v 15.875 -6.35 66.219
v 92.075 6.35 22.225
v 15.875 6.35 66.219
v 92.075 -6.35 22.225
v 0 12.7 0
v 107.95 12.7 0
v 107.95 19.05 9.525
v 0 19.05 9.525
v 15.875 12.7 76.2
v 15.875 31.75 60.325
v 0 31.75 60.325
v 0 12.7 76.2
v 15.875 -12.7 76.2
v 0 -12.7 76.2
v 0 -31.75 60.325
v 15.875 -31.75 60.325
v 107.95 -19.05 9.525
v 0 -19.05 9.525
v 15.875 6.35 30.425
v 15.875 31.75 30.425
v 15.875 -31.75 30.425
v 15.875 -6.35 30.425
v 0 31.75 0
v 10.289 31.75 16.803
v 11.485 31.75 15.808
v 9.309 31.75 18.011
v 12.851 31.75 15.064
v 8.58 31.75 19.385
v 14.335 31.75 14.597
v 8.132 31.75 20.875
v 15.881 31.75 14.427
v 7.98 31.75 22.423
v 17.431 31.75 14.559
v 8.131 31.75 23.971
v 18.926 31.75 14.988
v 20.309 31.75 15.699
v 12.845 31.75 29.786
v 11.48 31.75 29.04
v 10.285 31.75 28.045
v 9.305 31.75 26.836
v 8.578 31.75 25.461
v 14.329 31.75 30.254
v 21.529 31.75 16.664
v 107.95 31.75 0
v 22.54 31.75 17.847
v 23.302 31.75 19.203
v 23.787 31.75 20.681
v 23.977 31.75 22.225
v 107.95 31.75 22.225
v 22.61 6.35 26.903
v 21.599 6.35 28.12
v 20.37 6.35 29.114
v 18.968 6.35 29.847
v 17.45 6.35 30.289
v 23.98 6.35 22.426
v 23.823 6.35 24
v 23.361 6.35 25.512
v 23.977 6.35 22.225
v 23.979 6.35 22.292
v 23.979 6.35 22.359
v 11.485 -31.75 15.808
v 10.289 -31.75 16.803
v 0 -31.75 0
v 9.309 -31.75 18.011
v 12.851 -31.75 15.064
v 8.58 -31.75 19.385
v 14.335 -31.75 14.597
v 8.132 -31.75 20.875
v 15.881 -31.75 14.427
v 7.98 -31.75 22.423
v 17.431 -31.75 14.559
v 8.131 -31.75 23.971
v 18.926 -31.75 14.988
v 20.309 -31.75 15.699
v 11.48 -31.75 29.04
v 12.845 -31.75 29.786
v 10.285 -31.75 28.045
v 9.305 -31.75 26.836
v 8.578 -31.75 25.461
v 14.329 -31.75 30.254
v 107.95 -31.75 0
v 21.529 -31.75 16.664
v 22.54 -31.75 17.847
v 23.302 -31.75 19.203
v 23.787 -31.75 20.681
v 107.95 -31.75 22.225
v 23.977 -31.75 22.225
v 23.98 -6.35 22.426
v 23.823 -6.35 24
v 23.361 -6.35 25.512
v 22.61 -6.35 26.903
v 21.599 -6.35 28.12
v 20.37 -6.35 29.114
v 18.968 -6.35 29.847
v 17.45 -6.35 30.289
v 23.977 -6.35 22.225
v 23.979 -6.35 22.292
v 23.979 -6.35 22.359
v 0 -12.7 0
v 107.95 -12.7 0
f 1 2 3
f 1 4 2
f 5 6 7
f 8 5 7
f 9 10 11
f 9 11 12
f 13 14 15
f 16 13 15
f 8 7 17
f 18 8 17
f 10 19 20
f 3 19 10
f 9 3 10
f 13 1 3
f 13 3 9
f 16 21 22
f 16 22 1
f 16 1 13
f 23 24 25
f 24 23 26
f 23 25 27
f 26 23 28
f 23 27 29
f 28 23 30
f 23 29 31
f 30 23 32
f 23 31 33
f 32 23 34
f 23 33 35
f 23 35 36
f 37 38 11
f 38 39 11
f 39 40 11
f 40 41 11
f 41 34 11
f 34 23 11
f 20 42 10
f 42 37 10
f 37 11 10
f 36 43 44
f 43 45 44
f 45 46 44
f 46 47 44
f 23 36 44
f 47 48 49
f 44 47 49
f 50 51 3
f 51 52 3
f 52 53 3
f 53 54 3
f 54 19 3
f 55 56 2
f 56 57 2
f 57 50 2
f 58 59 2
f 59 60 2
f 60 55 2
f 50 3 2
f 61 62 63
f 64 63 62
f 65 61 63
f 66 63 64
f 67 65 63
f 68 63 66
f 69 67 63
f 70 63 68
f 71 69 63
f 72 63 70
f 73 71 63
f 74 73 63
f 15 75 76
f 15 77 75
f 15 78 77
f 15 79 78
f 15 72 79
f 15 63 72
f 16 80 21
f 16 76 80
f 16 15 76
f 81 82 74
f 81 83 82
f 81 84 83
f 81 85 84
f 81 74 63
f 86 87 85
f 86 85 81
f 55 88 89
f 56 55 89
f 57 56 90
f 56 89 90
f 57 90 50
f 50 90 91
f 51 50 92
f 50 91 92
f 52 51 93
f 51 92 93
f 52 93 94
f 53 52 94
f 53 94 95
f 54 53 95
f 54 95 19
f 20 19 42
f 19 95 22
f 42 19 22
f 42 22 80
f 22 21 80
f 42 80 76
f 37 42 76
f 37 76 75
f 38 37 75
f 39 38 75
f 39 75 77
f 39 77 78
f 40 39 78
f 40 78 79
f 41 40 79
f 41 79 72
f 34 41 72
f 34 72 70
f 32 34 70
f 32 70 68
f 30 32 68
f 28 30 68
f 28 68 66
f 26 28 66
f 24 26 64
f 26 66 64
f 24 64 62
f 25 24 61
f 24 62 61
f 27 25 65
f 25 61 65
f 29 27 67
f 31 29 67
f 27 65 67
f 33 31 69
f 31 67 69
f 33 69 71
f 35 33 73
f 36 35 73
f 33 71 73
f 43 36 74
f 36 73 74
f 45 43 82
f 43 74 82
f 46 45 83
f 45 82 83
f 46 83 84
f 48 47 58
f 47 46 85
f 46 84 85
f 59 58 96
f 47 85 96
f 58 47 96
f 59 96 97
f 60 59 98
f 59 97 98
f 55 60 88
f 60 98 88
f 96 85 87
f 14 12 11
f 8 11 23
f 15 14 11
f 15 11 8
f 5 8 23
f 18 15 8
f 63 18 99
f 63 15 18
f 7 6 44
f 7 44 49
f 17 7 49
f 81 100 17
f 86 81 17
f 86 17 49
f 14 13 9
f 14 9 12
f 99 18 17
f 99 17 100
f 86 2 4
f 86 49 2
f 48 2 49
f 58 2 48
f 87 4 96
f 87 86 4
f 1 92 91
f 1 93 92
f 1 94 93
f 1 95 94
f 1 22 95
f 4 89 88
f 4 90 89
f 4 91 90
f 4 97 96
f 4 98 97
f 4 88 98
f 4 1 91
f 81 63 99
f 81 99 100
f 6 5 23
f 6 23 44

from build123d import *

# Parameters (mm, degrees)
F1_DEPTH  = 31.75
F3_DEPTH  = 107.951
F5_DEPTH  = 6.35
F7_DEPTH  = 38.1
F8_DEPTH  = 25.4
F9_R      = 7.999836
F10_DEPTH = 127


with BuildPart() as f1:
    # F0 (on Front) → F1 (new body, symmetric)
    with BuildSketch(Plane.XZ):
        Polygon((0, 76.2), (0, 0), (107.95, 0), (107.95, 22.225), (15.875, 22.225), (15.875, 76.2), align=None)
    extrude(amount=F1_DEPTH, both=True)

    # F2 (on face) → F3 (cut, through all)
    with BuildSketch(Plane.YZ.offset(107.95)):
        Polygon((-12.7, 0), (12.7, 0), (19.05, 9.525), (-19.05, 9.525), align=None)
    extrude(amount=-F3_DEPTH, mode=Mode.SUBTRACT)

    # F4 (on Front) → F5 (join, symmetric)
    with BuildSketch(Plane.XZ):
        Polygon((92.075, 22.225), (15.875, 66.219091), (15.875, 22.225), align=None)
    extrude(amount=F5_DEPTH, both=True)

    # F6 (on face) → F7 (cut, symmetric)
    with BuildSketch(Plane(origin=(0, 0, 0), x_dir=(0, -1, 0), z_dir=(-1, 0, 0))):
        Polygon((-31.75, 60.325), (-12.7, 76.2), (-31.75, 76.2), align=None)
        Polygon((31.75, 76.2), (12.7, 76.2), (31.75, 60.325), align=None)
    extrude(amount=F7_DEPTH, both=True, mode=Mode.SUBTRACT)

    # F6 (on face) → F8 (cut)
    with BuildSketch(Plane(origin=(0, 0, 0), x_dir=(0, -1, 0), z_dir=(-1, 0, 0))):
        Polygon((-31.75, 60.325), (-12.7, 76.2), (-31.75, 76.2), align=None)
        Polygon((31.75, 76.2), (12.7, 76.2), (31.75, 60.325), align=None)
    extrude(amount=-F8_DEPTH, mode=Mode.SUBTRACT)

    # F9 (on Front) → F10 (cut, symmetric)
    with BuildSketch(Plane.XZ):
        with Locations((15.979823, 22.425991)):
            Circle(F9_R)
    extrude(amount=F10_DEPTH, both=True, mode=Mode.SUBTRACT)


solid = f1.part
